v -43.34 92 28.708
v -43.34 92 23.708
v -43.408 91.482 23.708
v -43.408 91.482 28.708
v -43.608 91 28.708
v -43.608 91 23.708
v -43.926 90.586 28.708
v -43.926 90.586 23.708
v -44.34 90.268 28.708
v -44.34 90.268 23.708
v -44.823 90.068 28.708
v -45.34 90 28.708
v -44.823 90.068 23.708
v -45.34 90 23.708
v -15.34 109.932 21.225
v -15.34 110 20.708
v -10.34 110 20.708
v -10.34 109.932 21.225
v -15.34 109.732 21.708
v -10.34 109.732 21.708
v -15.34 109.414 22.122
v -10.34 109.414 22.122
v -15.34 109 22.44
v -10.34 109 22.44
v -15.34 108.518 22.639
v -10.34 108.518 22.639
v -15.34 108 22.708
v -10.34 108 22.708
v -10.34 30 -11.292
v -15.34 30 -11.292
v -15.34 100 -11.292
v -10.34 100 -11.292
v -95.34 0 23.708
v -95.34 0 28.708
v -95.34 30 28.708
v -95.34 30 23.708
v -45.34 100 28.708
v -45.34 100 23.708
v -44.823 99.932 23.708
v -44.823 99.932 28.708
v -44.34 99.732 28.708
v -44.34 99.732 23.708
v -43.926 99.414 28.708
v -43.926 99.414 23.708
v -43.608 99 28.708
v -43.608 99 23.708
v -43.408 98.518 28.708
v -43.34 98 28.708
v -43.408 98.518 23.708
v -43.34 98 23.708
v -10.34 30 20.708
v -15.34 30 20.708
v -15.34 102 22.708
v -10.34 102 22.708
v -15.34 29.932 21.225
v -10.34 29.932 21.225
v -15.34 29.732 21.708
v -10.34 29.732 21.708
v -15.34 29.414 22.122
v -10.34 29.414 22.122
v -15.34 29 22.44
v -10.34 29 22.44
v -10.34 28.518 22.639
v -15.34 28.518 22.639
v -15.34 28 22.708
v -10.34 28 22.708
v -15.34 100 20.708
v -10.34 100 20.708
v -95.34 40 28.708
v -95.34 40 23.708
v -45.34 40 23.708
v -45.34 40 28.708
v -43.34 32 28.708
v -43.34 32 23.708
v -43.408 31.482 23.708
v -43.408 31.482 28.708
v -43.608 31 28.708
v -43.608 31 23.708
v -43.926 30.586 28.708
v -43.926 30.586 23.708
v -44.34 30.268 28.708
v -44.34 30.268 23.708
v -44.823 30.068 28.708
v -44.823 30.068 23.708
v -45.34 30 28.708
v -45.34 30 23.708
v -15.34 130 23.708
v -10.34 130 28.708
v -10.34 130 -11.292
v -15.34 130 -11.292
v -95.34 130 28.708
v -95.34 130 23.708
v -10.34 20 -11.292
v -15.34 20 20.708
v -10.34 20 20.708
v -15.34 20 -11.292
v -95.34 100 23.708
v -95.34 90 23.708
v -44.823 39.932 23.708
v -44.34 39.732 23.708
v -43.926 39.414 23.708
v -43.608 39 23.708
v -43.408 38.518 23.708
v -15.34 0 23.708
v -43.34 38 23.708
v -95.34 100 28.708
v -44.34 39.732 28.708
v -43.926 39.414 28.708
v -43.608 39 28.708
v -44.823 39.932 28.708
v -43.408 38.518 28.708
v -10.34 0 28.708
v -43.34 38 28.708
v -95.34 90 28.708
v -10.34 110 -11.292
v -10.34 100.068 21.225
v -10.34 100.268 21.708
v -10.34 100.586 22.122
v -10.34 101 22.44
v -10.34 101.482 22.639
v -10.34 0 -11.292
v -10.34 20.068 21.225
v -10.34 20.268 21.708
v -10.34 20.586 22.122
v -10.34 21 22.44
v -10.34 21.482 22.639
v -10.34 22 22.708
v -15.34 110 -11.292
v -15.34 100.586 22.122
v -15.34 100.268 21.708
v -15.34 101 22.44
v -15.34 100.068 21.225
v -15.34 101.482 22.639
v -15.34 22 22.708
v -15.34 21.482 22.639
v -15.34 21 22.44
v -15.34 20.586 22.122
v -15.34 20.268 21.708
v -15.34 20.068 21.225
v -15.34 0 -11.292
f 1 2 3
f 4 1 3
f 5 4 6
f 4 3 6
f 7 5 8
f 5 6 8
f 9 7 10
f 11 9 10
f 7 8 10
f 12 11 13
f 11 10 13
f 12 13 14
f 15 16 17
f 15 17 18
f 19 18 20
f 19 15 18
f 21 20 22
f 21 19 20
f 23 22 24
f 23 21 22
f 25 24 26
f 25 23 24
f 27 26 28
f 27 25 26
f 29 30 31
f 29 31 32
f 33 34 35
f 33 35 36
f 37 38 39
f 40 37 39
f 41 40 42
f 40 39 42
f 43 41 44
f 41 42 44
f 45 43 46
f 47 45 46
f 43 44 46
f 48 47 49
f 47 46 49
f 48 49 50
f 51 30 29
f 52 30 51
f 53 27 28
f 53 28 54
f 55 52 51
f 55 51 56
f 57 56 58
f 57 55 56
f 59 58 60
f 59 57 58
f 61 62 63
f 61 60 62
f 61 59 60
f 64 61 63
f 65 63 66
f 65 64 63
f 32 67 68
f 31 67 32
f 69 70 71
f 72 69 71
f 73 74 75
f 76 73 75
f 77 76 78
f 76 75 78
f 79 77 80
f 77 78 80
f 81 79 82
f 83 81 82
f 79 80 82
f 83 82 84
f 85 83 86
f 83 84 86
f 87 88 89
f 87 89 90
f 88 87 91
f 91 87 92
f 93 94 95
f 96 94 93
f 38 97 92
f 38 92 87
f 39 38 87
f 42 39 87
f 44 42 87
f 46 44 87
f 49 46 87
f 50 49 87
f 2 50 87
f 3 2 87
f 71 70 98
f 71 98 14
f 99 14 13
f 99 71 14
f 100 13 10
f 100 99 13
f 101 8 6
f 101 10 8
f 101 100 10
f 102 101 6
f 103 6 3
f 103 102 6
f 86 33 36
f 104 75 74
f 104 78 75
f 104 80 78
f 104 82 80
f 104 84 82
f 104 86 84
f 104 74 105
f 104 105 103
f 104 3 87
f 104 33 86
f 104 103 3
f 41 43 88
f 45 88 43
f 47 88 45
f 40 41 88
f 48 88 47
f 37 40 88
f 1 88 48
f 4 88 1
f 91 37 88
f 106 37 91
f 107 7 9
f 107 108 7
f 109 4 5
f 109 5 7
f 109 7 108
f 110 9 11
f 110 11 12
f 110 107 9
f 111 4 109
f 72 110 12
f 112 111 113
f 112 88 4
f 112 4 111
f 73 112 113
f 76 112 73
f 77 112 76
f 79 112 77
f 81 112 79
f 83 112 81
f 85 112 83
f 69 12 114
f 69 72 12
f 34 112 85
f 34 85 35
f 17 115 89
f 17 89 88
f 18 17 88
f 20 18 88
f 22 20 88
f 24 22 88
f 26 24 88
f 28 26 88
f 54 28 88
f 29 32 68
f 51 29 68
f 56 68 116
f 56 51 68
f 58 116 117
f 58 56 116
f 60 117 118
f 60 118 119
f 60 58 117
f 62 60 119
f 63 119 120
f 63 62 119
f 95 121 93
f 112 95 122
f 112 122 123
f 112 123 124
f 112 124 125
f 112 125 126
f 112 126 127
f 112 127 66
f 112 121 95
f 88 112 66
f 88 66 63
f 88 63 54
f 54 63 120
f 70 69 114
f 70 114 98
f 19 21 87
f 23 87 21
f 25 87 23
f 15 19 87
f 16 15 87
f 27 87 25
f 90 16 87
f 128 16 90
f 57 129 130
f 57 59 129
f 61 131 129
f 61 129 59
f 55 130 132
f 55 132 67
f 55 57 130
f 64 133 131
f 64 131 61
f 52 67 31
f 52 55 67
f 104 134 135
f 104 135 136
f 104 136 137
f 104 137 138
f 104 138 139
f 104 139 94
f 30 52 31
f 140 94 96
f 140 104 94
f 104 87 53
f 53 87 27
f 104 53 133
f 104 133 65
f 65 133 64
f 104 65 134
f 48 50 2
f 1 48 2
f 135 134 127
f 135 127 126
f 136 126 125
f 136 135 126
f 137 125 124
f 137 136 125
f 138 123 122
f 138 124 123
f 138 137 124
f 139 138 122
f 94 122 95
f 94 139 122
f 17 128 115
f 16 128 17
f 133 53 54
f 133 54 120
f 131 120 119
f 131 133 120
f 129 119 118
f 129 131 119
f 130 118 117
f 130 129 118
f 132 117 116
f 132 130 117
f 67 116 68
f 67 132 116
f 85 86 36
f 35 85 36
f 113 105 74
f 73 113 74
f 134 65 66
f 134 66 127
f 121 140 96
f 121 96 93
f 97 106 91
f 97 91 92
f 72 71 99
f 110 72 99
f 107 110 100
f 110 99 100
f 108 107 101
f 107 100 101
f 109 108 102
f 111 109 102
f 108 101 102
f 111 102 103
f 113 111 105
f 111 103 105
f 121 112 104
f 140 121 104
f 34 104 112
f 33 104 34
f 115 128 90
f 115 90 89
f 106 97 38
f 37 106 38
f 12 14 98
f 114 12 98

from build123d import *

# Parameters (mm, degrees)
BOSS_EXTRUDE1_DEPTH = 130
CUT_EXTRUDE1_DEPTH  = 10
CUT_EXTRUDE2_DEPTH  = 10


with BuildPart() as part:
    # Sketch1 → Boss-Extrude1 (new body)
    with BuildSketch(Plane(origin=(0, 0, 0), x_dir=(1, 0, 0), z_dir=(0, 1, 0))):
        Polygon((-95.340155061, -23.707512367), (-15.340155061, -23.707512367), (-15.340155061, 11.292487633), (-10.340155061, 11.292487633), (-10.340155061, -28.707512367), (-95.340155061, -28.707512367), align=None)
    extrude(amount=BOSS_EXTRUDE1_DEPTH)

    # Sketch2 → Cut-Extrude1 (cut)
    with BuildSketch(Plane.ZY.offset(15.340155061)):
        with BuildLine():
            Line((-11.292487633, 110), (20.707512367, 110))
            ThreePointArc((20.707512367, 110), (22.121725929, 109.414213562), (22.707512367, 108))
            Line((22.707512367, 108), (22.707512367, 102))
            ThreePointArc((22.707512367, 102), (22.121725929, 100.585786438), (20.707512367, 100))
            Line((20.707512367, 100), (-11.292487633, 100))
            Line((-11.292487633, 100), (-11.292487633, 110))
        make_face()
        with BuildLine():
            Line((-11.292487633, 30), (20.707512367, 30))
            ThreePointArc((20.707512367, 30), (22.121725929, 29.414213562), (22.707512367, 28))
            Line((22.707512367, 28), (22.707512367, 22))
            ThreePointArc((22.707512367, 22), (22.121725929, 20.585786438), (20.707512367, 20))
            Line((20.707512367, 20), (-11.292487633, 20))
            Line((-11.292487633, 20), (-11.292487633, 30))
        make_face()
    extrude(amount=-CUT_EXTRUDE1_DEPTH, mode=Mode.SUBTRACT)

    # Sketch3 → Cut-Extrude2 (cut)
    with BuildSketch(Plane(origin=(0, 0, 23.707512367), x_dir=(-1, 0, 0), z_dir=(0, 0, -1))):
        with BuildLine():
            Line((95.340155061, 100), (45.340155061, 100))
            ThreePointArc((45.340155061, 100), (43.925941499, 99.414213562), (43.340155061, 98))
            Line((43.340155061, 98), (43.340155061, 92))
            ThreePointArc((43.340155061, 92), (43.925941499, 90.585786438), (45.340155061, 90))
            Line((45.340155061, 90), (95.340155061, 90))
            Line((95.340155061, 90), (95.340155061, 100))
        make_face()
        with BuildLine():
            Line((95.340155061, 40), (45.340155061, 40))
            ThreePointArc((45.340155061, 40), (43.925941499, 39.414213562), (43.340155061, 38))
            Line((43.340155061, 38), (43.340155061, 32))
            ThreePointArc((43.340155061, 32), (43.925941499, 30.585786438), (45.340155061, 30))
            Line((45.340155061, 30), (95.340155061, 30))
            Line((95.340155061, 30), (95.340155061, 40))
        make_face()
    extrude(amount=-CUT_EXTRUDE2_DEPTH, mode=Mode.SUBTRACT)


solid = part.part
